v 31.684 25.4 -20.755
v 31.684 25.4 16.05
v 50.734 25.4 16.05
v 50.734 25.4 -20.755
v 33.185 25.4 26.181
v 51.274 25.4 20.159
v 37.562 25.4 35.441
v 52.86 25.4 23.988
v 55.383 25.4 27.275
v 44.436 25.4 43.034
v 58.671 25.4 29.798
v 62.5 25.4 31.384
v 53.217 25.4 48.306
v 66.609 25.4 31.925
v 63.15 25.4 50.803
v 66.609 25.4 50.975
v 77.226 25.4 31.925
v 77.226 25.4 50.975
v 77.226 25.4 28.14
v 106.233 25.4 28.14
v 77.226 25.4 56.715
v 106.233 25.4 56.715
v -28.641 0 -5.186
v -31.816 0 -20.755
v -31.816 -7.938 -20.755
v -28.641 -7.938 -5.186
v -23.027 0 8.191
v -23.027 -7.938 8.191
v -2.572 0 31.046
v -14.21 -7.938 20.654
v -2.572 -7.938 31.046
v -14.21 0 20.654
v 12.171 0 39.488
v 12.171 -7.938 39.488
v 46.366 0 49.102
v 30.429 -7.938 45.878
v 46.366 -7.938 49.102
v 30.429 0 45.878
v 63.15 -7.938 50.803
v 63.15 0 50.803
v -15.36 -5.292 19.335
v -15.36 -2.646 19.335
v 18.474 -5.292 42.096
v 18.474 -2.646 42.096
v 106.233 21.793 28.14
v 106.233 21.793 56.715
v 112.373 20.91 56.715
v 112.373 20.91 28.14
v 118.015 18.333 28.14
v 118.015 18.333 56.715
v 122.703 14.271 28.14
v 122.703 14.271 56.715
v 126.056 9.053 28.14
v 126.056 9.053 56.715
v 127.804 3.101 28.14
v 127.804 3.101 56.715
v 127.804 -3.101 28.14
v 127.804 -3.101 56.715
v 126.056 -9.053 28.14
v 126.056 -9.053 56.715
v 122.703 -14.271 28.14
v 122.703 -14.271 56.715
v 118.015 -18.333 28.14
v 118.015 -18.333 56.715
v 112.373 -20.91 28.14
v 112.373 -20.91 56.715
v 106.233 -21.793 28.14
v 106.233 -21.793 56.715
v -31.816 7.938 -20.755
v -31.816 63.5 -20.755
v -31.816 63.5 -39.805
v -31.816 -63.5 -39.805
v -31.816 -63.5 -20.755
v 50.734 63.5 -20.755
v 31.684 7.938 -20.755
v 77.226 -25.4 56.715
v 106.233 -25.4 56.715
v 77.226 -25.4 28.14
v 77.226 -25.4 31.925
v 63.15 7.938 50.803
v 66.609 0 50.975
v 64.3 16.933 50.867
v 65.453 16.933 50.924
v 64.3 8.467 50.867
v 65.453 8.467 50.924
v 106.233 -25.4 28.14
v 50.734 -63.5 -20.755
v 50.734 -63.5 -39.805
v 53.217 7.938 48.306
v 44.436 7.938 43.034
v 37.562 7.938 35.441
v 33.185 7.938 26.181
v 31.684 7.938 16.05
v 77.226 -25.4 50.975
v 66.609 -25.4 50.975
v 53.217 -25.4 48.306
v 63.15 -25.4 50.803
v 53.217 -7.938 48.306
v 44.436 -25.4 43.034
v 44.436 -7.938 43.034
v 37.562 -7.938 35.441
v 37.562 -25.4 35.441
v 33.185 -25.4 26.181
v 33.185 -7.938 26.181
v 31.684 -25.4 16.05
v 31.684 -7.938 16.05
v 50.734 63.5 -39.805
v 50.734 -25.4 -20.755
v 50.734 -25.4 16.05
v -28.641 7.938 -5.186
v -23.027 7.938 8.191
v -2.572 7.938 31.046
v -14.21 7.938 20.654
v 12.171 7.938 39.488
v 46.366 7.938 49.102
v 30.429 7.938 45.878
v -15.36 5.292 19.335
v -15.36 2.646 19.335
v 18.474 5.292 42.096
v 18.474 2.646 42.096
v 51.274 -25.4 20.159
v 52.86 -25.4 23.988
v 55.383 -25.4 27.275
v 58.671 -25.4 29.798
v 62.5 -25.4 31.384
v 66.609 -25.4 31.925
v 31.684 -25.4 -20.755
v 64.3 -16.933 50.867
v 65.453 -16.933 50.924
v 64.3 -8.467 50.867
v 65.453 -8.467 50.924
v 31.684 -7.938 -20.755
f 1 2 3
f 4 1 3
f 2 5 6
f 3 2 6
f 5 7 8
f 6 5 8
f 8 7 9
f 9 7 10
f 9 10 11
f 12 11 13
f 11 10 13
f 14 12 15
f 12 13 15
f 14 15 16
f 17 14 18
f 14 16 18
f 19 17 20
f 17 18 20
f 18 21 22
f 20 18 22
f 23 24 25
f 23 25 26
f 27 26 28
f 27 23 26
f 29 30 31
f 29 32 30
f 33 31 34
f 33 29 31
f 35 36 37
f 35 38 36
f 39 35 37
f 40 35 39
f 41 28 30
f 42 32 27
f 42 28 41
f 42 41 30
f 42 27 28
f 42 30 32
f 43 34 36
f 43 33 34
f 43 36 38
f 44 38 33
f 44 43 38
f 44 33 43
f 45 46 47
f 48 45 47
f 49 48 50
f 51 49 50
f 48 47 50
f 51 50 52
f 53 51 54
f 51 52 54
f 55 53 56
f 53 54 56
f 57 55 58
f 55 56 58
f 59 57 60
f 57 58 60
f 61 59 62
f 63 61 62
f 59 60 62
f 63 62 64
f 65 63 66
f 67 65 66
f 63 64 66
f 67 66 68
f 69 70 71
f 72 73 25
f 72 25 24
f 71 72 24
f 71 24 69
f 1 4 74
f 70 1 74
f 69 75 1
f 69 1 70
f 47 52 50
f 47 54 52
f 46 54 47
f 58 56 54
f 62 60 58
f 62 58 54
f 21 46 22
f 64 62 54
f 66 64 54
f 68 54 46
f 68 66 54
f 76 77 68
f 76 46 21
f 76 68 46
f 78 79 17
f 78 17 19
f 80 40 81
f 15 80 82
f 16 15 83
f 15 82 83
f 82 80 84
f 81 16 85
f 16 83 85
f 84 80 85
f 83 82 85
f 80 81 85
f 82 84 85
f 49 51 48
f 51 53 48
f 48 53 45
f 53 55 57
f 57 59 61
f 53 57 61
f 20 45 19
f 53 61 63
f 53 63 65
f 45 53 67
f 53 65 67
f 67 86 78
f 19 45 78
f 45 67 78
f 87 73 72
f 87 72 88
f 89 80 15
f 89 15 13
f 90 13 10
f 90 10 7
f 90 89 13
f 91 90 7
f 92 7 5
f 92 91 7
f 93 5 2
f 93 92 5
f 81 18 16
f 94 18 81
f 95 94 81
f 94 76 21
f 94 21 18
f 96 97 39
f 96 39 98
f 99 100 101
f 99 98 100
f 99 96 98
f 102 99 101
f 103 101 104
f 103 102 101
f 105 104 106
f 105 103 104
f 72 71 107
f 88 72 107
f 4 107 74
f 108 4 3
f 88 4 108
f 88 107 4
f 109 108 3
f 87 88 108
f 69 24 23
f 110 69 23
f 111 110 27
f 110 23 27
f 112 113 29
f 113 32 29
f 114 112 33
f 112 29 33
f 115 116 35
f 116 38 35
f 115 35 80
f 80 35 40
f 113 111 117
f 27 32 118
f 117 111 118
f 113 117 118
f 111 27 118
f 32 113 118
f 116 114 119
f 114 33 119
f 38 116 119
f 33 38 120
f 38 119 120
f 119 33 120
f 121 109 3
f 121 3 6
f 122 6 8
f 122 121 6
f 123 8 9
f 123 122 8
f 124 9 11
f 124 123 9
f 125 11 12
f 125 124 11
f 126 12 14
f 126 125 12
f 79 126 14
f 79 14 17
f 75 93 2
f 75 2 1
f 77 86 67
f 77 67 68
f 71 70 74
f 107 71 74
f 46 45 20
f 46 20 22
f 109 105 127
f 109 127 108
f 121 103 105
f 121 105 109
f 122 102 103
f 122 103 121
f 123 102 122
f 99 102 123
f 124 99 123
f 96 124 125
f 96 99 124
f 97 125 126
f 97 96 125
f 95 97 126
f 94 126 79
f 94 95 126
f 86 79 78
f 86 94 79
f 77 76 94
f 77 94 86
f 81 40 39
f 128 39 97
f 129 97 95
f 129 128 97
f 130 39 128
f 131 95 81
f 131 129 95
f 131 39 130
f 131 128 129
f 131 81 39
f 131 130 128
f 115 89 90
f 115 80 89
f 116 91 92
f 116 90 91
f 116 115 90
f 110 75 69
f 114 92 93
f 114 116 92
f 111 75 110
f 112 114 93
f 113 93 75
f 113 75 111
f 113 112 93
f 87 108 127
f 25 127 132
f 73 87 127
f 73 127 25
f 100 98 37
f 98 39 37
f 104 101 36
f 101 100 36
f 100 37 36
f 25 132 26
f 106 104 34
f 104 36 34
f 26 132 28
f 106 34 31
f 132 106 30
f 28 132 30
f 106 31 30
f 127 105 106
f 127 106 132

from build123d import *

# Parameters (mm, degrees)
F1_DEPTH = 63.5
F2_DEPTH = 25.4
F3_DEPTH = 7.9375
F0_W     = 21.7925966091
F0_H     = 28.575


with BuildPart() as f1:
    # F0 (on Front) → F1 (new body, symmetric)
    with BuildSketch(Plane.XZ):
        Polygon((31.6835418344, -20.7545107607), (-31.8164581656, -20.7545107607), (-31.8164581656, -39.8045107607), (50.7335418344, -39.8045107607), (50.7335418344, -20.7545107607), align=None)
    extrude(amount=F1_DEPTH, both=True)

    # F0 (on Front) → F2 (join, symmetric)
    with BuildSketch(Plane.XZ):
        with BuildLine():
            Line((31.6835418344, 16.0500892393), (31.6835418344, -20.7545107607))
            Line((31.6835418344, -20.7545107607), (50.7335418344, -20.7545107607))
            Line((50.7335418344, -20.7545107607), (50.7335418344, 16.0500892393))
            ThreePointArc((50.7335418344, 16.0500892393), (55.383221683, 27.2754093906), (66.6085418344, 31.9250892393))
            Line((66.6085418344, 31.9250892393), (77.2256346173, 31.9250892393))
            Line((77.2256346173, 31.9250892393), (77.2256346173, 50.9750892393))
            Line((77.2256346173, 50.9750892393), (66.6085418344, 50.9750892393))
            add(Edge.make_bspline(
                [(63.1497321777, 50.8033949922), (64.2990860037, 50.8698615177), (65.4521577964, 50.9270251755), (66.6085418344, 50.9750892393)],
                knots=[118.9365229564, 118.9365229564, 118.9365229564, 118.9365229564, 121.7892283462, 121.7892283462, 121.7892283462, 121.7892283462], degree=3))
            ThreePointArc((63.1497321777, 50.8033949922), (40.7188281216, 39.4910437606), (31.6835418344, 16.0500892393))
        make_face()
        Polygon((77.2256346173, 56.7154892393), (77.2256346173, 50.9750892393), (77.2256346173, 31.9250892393), (77.2256346173, 28.1404892393), (106.2330380082, 28.1404892393), (106.2330380082, 56.7154892393), align=None)
    extrude(amount=F2_DEPTH, both=True)

    # F0 (on Front) → F3 (join, symmetric)
    with BuildSketch(Plane.XZ):
        with BuildLine():
            add(Edge.make_bspline(
                [(-31.8164581656, -20.7545107607), (-26.2263988588, 29.0902056228), (15.2302560918, 48.0322369679), (63.1497321777, 50.8033949922)],
                knots=[0, 0, 0, 0, 118.9365229564, 118.9365229564, 118.9365229564, 118.9365229564], degree=3))
            Line((-31.8164581656, -20.7545107607), (31.6835418344, -20.7545107607))
            Line((31.6835418344, -20.7545107607), (31.6835418344, 16.0500892393))
            ThreePointArc((31.6835418344, 16.0500892393), (40.7188281216, 39.4910437606), (63.1497321777, 50.8033949922))
        make_face()
    extrude(amount=F3_DEPTH, both=True)

    # F0 (on Front) → F4 (revolve)
    with BuildSketch(Plane.XZ):
        with Locations((117.1293363128, 42.4279892393)):
            Rectangle(F0_W, F0_H)
    revolve(axis=Axis((106.2330380082, 0, 42.4279892393), (0, 0, -1)))


solid = f1.part
